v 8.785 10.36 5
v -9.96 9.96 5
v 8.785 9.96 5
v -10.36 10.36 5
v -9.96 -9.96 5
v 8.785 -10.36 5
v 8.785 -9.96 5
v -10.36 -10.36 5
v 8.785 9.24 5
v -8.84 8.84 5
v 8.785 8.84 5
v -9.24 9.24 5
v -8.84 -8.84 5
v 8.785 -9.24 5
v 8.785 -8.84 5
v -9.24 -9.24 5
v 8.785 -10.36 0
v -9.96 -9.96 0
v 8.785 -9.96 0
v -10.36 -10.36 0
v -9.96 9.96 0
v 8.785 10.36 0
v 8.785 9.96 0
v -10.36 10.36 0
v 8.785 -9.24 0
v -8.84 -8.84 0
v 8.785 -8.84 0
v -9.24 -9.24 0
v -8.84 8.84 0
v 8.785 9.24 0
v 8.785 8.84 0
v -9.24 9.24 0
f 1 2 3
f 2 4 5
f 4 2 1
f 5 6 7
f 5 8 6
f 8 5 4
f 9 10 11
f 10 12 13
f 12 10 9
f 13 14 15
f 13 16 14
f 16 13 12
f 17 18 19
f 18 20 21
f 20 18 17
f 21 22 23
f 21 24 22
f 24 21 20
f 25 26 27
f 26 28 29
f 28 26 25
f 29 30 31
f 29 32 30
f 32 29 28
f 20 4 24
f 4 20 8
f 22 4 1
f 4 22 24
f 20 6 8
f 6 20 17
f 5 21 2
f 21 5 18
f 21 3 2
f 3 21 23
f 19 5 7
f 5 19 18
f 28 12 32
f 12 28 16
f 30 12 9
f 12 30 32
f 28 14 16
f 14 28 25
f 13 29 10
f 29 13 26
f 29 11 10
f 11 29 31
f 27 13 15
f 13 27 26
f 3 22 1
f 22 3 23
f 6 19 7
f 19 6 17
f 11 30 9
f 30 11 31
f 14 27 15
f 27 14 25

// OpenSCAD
filament_w = 0.4;
overhang = 0.90;
support_h = 5;
outset = filament_w * overhang;
overlap = filament_w - outset;
/*
translate([0, 0, 10])
cube(size=[20, 20, 10], center=true);
translate([19.9, 0, 7.5])
cube(size=[20.1, 20, 15], center=true);
*/
module shell(side) {
 translate([0, 0, support_h / 2])
 difference() {
  cube(size=[side, side, support_h], center=true);
  cube(size=[side - filament_w * 2, side - filament_w * 2, support_h + 1], center=true);
 }
}

difference() {
union() {
shell(20 + filament_w * overhang * 2);
shell(20 - filament_w * 2 - filament_w * overhang * 2);
}
translate([20 - filament_w * 2 - 0.01, 0, support_h / 2])
cube(size=[20 + filament_w * 2 + 0.01, 20 + filament_w * 3 + 0.01, support_h], center=true);
}

/*
translate([0, 0, support_h / 2])
difference() {
cube(size=[20 + outset, 20 + outset, support_h], center=true);
cube(size=[20 - overlap, 20 - overlap, support_h], center=true);
}
translate([0, 0, support_h / 2])
difference() {
cube(size=[20 - filament_w * 2 - outset, 
	       20 - filament_w * 2 - outset, support_h], 
     center=true);
cube(size=[20 - filament_w - filament_w * 2 - overlap, 
           20 - filament_w - filament_w * 2- overlap, support_h], 
     center=true);
}
*/
